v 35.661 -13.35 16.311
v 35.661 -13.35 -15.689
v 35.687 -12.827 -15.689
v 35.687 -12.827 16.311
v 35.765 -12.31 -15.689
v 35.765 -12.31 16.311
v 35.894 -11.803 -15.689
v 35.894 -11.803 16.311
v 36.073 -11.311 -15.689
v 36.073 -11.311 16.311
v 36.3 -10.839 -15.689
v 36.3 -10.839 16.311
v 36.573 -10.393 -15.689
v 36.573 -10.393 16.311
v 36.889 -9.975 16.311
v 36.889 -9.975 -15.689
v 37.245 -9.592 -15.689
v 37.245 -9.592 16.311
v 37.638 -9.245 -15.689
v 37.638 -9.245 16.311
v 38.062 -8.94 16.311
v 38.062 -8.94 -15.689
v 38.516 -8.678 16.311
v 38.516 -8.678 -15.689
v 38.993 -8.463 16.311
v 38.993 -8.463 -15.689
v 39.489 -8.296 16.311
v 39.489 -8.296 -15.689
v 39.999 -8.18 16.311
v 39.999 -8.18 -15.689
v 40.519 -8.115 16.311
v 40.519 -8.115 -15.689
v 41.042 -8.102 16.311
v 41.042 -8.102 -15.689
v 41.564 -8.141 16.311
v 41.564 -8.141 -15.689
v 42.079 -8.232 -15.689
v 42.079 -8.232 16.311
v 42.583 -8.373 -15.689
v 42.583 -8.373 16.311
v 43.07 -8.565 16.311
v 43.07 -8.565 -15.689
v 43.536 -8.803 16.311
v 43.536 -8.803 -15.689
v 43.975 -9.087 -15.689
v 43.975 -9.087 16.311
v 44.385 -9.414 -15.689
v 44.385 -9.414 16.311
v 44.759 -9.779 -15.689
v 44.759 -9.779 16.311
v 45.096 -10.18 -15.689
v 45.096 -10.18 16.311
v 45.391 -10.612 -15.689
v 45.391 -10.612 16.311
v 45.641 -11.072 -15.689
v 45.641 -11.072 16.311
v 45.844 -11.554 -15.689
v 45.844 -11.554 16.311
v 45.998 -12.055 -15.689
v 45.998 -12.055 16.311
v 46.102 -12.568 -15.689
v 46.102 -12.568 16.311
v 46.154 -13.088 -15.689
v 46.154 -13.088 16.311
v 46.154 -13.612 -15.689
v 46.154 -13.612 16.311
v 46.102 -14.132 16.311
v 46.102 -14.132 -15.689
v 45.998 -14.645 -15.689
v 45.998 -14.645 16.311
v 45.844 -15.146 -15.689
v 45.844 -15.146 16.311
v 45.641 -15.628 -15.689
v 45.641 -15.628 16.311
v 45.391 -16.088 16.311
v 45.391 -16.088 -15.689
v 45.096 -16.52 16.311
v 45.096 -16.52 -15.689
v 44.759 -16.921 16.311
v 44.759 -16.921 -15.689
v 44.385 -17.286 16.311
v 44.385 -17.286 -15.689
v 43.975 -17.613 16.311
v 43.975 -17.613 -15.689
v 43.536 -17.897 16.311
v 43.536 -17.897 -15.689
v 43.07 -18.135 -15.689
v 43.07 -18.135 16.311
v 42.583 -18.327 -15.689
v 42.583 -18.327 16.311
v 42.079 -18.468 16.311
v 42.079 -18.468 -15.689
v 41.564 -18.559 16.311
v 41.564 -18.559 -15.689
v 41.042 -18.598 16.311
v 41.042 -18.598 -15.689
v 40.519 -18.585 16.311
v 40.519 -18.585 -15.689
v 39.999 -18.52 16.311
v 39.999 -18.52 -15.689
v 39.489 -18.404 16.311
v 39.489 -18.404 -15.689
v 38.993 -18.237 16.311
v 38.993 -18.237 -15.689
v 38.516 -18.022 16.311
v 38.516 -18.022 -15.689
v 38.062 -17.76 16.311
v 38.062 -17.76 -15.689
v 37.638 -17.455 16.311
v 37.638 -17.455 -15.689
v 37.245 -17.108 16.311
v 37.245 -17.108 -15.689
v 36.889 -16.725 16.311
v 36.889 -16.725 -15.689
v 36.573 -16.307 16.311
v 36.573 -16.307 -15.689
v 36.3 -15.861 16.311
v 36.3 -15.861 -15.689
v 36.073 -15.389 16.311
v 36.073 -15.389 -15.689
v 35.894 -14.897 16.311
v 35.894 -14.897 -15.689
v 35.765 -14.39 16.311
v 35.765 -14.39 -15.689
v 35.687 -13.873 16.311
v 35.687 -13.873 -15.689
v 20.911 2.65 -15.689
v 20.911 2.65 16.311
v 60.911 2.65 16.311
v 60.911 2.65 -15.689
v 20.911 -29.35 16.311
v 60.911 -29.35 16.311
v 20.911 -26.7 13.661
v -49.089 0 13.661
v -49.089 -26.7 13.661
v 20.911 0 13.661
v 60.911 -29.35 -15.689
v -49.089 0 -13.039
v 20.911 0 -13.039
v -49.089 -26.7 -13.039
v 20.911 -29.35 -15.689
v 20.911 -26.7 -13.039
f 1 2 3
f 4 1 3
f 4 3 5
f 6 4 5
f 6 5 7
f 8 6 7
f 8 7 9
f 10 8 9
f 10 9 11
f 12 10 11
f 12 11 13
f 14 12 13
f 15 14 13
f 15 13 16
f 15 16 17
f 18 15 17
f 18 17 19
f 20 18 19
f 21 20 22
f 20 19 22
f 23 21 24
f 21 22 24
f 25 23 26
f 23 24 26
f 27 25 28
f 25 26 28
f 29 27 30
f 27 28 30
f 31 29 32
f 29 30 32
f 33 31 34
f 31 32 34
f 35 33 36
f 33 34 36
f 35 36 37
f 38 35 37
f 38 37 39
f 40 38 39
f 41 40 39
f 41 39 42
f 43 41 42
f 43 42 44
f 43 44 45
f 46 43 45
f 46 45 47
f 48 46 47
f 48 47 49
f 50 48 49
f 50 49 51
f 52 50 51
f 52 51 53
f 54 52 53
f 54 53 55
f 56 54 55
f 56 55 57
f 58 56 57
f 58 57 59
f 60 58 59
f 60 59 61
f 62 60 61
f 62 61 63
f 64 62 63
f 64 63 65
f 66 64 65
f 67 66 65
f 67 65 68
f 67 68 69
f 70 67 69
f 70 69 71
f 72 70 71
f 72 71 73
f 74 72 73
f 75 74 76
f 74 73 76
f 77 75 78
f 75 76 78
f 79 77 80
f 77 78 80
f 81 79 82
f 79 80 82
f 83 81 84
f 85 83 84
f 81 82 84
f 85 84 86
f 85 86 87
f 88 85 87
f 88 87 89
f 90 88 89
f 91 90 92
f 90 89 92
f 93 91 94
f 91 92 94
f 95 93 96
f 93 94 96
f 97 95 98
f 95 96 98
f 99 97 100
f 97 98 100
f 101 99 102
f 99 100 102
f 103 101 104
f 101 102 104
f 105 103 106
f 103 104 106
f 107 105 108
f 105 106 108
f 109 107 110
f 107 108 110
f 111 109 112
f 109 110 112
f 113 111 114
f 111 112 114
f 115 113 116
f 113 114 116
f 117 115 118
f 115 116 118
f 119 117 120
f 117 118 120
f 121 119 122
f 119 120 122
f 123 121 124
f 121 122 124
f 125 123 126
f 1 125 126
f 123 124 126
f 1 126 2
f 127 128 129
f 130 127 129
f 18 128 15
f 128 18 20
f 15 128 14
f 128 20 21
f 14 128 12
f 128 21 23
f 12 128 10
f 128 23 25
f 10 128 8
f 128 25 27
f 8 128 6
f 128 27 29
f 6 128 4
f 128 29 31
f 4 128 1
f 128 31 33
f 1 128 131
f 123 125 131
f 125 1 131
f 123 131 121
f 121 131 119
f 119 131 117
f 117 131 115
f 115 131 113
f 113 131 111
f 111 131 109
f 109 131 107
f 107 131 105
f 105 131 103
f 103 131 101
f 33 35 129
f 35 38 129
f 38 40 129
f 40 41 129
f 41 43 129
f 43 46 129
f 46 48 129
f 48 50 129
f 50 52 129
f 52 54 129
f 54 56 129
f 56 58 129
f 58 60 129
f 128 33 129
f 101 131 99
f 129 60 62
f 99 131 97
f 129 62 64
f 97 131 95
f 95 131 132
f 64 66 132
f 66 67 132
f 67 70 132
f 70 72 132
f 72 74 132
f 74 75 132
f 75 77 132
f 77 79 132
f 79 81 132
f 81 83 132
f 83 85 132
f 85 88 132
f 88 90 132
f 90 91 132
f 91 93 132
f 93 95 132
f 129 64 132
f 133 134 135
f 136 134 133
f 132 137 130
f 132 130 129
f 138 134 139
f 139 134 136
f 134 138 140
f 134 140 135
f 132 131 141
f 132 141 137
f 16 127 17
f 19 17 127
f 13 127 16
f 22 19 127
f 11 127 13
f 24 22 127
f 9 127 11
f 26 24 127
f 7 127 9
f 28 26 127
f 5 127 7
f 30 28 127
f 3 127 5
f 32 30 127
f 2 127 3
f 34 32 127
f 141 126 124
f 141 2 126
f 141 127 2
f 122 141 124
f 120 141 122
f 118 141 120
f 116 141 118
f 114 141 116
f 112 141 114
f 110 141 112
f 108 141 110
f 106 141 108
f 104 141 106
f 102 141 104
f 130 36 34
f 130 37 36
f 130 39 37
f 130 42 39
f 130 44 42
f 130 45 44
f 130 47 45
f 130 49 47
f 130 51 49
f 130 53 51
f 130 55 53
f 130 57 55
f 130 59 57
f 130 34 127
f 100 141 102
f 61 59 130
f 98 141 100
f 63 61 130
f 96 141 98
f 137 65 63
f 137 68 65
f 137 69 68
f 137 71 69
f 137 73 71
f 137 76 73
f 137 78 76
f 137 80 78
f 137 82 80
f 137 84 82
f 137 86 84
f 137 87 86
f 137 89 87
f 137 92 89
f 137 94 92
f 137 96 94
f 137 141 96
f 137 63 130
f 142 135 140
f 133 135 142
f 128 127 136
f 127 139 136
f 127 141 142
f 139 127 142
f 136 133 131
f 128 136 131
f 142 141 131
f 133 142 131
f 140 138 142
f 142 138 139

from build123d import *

# Parameters (mm, degrees)
F0_W          = 70
F0_H          = 26.7
F2_DEPTH      = 26.7
F1_W          = 40
F1_H          = 32
F3_DEPTH      = 29.35
F3_DEPTH_BACK = 2.65
F5_D          = 10.5


with BuildPart() as f2:
    # F0 (on Front) → F2 (new body)
    with BuildSketch(Plane.XZ):
        with Locations((-14.08916, 0.31107)):
            Rectangle(F0_W, F0_H)
    extrude(amount=F2_DEPTH)

    # F1 (on Front) → F3 (join, two sides)
    with BuildSketch(Plane.XZ) as f3_sk:
        with Locations((40.91084, 0.31107)):
            Rectangle(F1_W, F1_H)
    extrude(amount=F3_DEPTH)
    extrude(f3_sk.sketch, amount=-F3_DEPTH_BACK)

    # F5 (through all)
    with Locations(Plane.XY.offset(16.31107)):
        with Locations((40.91084, -13.35)):
            Hole(F5_D / 2)


solid = f2.part
